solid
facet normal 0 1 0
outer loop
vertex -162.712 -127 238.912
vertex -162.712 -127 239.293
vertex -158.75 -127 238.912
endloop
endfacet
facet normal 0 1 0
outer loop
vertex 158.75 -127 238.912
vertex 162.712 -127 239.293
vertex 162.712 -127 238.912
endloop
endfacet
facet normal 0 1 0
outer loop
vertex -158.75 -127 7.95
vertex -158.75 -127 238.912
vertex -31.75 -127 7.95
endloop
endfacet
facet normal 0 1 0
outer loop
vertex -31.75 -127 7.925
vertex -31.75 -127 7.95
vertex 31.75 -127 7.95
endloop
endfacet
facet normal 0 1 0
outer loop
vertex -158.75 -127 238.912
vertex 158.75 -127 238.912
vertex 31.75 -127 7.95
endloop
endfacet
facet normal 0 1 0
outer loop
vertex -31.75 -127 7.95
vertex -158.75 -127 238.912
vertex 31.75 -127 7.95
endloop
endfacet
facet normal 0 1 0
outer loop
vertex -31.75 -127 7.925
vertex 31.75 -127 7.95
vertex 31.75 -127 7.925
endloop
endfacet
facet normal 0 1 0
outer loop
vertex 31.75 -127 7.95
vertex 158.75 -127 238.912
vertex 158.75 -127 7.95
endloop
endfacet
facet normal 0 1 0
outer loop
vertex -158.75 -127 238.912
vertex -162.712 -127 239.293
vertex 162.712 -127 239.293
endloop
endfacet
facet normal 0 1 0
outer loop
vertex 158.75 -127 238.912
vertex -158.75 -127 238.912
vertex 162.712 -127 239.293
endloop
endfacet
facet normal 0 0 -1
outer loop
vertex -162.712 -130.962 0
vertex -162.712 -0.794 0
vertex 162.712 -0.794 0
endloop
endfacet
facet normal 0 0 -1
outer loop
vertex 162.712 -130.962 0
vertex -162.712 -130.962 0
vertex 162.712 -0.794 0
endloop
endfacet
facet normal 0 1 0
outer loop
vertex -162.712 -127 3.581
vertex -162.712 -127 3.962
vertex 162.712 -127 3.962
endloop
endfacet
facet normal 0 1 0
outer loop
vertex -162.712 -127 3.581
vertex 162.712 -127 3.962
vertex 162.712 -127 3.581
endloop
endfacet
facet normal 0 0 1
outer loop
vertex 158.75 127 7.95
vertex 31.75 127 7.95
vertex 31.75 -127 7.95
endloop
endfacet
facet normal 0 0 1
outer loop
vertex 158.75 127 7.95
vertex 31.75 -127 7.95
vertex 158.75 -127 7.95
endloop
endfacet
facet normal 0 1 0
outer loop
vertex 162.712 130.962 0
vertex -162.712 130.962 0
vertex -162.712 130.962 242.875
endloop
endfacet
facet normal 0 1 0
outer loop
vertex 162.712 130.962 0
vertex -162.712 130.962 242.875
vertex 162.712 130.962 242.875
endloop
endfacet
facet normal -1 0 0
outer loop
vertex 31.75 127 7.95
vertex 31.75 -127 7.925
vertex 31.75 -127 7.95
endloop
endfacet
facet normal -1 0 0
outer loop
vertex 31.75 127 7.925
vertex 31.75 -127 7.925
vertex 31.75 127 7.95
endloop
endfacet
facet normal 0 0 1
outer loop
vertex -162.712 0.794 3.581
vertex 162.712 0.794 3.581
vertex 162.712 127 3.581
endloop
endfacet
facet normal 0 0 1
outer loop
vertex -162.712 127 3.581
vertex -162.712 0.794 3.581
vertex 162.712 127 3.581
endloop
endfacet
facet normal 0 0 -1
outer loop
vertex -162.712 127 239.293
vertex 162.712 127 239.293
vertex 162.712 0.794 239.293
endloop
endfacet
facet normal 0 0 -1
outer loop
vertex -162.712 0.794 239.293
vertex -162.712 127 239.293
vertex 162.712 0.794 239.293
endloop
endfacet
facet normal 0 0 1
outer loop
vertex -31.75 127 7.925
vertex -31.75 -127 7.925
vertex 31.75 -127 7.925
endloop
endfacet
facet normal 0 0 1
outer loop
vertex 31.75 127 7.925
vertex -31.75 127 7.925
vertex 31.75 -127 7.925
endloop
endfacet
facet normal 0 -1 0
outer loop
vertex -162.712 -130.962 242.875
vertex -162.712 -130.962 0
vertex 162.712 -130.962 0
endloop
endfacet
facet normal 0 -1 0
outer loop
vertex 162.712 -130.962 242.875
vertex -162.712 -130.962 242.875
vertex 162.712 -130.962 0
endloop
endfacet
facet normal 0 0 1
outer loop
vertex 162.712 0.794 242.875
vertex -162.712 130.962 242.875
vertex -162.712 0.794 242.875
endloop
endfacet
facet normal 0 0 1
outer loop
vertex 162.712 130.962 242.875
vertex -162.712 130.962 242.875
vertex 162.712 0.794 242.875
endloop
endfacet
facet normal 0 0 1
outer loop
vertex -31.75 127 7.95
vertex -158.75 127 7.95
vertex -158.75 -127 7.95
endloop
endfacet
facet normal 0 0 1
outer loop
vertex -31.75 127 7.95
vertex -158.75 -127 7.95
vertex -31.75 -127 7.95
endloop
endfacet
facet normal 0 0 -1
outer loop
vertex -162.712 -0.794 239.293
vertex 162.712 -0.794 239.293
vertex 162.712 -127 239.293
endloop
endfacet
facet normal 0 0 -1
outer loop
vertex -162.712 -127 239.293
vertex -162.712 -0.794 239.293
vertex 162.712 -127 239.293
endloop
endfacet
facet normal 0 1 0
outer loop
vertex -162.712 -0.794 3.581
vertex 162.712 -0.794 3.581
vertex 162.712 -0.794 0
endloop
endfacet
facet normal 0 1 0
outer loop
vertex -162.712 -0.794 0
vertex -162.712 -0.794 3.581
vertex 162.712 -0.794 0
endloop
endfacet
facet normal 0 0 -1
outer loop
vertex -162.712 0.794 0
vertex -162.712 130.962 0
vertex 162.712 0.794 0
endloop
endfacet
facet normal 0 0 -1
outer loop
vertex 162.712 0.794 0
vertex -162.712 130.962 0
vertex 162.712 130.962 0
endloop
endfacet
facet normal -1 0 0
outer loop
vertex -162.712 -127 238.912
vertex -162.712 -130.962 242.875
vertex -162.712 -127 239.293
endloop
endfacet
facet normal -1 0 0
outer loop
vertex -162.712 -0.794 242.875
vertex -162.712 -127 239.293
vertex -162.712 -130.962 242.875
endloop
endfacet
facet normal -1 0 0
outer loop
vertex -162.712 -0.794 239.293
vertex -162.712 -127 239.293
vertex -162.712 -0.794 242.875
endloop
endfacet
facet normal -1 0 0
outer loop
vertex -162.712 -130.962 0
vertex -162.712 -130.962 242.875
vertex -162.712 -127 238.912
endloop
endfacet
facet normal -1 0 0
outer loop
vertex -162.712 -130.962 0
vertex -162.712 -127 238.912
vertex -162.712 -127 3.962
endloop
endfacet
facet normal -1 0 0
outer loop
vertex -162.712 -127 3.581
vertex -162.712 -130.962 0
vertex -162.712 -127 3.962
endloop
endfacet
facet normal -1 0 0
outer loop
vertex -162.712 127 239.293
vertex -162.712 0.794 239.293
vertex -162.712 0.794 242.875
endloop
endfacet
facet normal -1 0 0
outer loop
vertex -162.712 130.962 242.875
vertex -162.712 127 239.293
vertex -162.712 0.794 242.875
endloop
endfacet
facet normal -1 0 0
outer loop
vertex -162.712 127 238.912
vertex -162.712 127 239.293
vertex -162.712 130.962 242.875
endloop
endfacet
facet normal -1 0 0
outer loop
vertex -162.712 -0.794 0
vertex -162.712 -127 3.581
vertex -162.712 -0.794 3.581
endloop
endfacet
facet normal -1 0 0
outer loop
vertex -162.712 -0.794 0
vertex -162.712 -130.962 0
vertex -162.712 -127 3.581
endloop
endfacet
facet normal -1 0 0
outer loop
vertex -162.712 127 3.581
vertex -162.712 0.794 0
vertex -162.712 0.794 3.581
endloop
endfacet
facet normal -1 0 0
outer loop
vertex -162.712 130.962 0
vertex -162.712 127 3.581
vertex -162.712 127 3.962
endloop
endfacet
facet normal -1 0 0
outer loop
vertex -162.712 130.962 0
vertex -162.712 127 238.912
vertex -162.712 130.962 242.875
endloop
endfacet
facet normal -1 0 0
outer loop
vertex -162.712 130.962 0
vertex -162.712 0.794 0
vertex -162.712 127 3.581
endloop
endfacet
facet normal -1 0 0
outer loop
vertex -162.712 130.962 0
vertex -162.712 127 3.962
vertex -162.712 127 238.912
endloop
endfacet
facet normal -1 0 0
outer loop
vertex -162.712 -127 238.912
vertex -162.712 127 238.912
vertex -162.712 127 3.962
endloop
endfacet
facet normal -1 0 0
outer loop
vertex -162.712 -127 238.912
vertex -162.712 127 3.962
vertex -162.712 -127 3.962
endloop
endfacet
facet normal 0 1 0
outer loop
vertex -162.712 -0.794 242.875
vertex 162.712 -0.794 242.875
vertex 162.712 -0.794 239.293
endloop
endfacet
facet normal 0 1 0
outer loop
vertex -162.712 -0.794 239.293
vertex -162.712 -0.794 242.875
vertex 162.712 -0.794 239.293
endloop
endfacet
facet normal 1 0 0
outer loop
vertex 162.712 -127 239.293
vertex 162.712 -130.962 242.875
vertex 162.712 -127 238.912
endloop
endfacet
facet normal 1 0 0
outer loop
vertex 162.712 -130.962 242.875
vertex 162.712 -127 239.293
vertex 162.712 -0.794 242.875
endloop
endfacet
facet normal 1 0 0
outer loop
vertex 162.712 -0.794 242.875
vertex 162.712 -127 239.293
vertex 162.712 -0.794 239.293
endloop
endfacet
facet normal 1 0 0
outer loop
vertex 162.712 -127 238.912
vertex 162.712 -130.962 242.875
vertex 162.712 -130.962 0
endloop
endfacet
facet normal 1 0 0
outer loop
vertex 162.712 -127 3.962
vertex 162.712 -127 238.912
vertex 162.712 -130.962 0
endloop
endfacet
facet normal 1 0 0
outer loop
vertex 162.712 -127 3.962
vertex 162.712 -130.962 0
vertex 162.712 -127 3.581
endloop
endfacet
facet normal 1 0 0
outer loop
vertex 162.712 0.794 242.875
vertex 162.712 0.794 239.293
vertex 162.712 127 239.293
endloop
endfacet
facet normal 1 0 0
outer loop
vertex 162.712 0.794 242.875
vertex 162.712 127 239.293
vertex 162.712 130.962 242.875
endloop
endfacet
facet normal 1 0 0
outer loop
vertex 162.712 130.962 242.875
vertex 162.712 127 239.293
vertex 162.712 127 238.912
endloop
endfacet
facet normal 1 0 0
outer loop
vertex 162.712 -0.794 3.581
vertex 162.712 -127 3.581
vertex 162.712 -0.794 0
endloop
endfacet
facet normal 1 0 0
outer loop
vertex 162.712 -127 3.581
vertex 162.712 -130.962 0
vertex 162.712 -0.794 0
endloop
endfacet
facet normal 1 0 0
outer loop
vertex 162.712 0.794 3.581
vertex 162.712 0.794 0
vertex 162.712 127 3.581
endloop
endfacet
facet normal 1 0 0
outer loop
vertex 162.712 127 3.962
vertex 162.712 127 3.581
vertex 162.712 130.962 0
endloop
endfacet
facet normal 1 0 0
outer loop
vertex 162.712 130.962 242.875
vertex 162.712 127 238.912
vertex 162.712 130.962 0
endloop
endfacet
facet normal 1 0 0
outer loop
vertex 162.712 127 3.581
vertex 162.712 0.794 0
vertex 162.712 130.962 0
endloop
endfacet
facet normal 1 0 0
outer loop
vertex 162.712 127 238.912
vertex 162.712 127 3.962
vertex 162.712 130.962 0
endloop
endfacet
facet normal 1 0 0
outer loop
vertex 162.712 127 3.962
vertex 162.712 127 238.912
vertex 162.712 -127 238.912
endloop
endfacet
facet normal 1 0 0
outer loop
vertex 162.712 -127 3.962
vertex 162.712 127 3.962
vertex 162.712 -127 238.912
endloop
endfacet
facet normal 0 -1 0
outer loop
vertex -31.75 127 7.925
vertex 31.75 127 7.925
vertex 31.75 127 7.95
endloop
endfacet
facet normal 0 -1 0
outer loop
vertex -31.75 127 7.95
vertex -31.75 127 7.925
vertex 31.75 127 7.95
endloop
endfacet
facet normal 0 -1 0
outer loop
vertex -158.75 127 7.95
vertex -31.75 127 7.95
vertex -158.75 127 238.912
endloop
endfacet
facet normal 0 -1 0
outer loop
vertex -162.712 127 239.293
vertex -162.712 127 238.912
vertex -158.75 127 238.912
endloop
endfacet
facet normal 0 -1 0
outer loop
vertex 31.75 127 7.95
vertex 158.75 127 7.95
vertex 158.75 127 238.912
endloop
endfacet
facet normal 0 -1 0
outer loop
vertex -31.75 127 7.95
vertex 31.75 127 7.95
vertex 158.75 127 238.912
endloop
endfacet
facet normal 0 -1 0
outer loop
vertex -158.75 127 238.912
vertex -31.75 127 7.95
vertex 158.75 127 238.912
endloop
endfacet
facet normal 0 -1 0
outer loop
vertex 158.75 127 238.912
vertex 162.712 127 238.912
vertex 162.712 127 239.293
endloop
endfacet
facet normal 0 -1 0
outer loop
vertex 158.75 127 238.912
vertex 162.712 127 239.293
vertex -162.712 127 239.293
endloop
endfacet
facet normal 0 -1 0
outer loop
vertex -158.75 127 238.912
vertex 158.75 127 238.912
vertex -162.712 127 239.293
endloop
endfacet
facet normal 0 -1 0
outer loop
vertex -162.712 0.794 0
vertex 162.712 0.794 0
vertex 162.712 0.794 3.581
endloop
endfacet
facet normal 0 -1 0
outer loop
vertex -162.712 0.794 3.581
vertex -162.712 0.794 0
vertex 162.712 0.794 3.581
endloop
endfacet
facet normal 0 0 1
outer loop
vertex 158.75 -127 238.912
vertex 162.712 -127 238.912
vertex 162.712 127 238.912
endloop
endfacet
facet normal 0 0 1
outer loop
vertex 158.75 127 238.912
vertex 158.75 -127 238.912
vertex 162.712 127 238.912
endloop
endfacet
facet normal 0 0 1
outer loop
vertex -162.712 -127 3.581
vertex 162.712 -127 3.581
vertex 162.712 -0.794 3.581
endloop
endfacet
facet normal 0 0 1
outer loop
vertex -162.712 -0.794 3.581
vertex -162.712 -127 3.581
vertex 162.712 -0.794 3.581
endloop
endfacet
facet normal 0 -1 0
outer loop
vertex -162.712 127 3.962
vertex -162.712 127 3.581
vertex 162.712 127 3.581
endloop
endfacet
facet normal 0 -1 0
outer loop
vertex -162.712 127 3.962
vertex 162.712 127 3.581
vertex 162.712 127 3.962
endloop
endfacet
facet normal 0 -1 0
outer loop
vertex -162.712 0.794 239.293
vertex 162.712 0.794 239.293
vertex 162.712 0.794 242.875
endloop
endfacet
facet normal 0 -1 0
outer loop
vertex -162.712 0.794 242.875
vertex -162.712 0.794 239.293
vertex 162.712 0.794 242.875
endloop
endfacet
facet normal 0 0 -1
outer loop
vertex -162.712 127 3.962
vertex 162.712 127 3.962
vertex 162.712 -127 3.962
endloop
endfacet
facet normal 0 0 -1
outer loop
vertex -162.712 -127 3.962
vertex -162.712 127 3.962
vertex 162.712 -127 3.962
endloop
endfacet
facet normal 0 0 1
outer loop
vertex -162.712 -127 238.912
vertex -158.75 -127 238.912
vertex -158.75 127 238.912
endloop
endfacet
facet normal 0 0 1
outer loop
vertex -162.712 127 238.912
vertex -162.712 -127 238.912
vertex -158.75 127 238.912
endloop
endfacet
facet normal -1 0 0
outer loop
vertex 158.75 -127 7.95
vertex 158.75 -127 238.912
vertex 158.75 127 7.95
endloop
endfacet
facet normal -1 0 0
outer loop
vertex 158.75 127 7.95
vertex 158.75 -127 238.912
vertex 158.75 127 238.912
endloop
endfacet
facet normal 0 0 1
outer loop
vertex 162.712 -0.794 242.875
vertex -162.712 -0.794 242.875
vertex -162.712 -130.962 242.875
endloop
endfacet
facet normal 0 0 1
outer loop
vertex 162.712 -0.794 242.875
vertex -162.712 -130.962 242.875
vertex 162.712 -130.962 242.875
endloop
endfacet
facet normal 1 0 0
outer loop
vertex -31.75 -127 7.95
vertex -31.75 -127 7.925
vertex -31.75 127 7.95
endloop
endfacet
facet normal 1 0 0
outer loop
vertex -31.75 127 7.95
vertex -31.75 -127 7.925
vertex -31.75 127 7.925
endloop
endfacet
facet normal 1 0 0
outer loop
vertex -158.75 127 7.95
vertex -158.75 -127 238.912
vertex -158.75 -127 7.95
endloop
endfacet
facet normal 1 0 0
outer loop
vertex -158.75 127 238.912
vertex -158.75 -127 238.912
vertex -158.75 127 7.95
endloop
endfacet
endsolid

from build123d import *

# Parameters (mm, degrees)
F0_W      = 325.4248
F0_H      = 261.9248
F1_DEPTH  = 242.8748
F2_W      = 317.5
F2_H      = 254
F3_DEPTH  = 234.95
F5_DEPTH  = 698.5
F7_W      = 127
F7_H      = 254
F8_DEPTH  = 3.9624
F10_W     = 325.4248
F10_H     = 261.9248
F11_DEPTH = 3.9624
F13_DEPTH = 338.328


with BuildPart() as f1:
    # F0 (on Top) → F1 (new body)
    with BuildSketch(Plane.XY):
        Rectangle(F0_W, F0_H)
    extrude(amount=F1_DEPTH)

    # F2 (on face) → F3 (cut)
    with BuildSketch(Plane.XY.offset(242.8748)):
        Rectangle(F2_W, F2_H)
    extrude(amount=-F3_DEPTH, mode=Mode.SUBTRACT)

    # F4 (on face) → F5 (cut)
    with BuildSketch(Plane.YZ.offset(162.7124)):
        Polygon((127, 3.9624), (0.79375, 3.9624), (-0.79375, 3.9624), (-127, 3.9624), (-127, 3.5814), (-0.79375, 3.5814), (-0.79375, -3.9624), (0.79375, -3.9624), (0.79375, 3.5814), (127, 3.5814), align=None)
    extrude(amount=-F5_DEPTH, mode=Mode.SUBTRACT)

    # F7 (on offset) → F8 (join)
    with BuildSketch(Plane.XY.offset(3.9878)):
        with Locations((95.25, 0)):
            Rectangle(F7_W, F7_H)
        with Locations((-95.25, 0)):
            Rectangle(F7_W, F7_H)
    extrude(amount=F8_DEPTH)

    # F10 (on face) → F11 (join)
    with BuildSketch(Plane.XY.offset(242.8748)):
        Rectangle(F10_W, F10_H)
    extrude(amount=-F11_DEPTH)

    # F12 (on face) → F13 (cut)
    with BuildSketch(Plane.YZ.offset(162.7124)):
        Polygon((0, 242.8748), (-0.79375, 242.8748), (-0.79375, 239.2934), (-127, 239.2934), (-127, 238.9124), (0, 238.9124), align=None)
        Polygon((0.79375, 242.8748), (0, 242.8748), (0, 238.9124), (127, 238.9124), (127, 239.2934), (0.79375, 239.2934), align=None)
    extrude(amount=-F13_DEPTH, mode=Mode.SUBTRACT)


solid = f1.part
